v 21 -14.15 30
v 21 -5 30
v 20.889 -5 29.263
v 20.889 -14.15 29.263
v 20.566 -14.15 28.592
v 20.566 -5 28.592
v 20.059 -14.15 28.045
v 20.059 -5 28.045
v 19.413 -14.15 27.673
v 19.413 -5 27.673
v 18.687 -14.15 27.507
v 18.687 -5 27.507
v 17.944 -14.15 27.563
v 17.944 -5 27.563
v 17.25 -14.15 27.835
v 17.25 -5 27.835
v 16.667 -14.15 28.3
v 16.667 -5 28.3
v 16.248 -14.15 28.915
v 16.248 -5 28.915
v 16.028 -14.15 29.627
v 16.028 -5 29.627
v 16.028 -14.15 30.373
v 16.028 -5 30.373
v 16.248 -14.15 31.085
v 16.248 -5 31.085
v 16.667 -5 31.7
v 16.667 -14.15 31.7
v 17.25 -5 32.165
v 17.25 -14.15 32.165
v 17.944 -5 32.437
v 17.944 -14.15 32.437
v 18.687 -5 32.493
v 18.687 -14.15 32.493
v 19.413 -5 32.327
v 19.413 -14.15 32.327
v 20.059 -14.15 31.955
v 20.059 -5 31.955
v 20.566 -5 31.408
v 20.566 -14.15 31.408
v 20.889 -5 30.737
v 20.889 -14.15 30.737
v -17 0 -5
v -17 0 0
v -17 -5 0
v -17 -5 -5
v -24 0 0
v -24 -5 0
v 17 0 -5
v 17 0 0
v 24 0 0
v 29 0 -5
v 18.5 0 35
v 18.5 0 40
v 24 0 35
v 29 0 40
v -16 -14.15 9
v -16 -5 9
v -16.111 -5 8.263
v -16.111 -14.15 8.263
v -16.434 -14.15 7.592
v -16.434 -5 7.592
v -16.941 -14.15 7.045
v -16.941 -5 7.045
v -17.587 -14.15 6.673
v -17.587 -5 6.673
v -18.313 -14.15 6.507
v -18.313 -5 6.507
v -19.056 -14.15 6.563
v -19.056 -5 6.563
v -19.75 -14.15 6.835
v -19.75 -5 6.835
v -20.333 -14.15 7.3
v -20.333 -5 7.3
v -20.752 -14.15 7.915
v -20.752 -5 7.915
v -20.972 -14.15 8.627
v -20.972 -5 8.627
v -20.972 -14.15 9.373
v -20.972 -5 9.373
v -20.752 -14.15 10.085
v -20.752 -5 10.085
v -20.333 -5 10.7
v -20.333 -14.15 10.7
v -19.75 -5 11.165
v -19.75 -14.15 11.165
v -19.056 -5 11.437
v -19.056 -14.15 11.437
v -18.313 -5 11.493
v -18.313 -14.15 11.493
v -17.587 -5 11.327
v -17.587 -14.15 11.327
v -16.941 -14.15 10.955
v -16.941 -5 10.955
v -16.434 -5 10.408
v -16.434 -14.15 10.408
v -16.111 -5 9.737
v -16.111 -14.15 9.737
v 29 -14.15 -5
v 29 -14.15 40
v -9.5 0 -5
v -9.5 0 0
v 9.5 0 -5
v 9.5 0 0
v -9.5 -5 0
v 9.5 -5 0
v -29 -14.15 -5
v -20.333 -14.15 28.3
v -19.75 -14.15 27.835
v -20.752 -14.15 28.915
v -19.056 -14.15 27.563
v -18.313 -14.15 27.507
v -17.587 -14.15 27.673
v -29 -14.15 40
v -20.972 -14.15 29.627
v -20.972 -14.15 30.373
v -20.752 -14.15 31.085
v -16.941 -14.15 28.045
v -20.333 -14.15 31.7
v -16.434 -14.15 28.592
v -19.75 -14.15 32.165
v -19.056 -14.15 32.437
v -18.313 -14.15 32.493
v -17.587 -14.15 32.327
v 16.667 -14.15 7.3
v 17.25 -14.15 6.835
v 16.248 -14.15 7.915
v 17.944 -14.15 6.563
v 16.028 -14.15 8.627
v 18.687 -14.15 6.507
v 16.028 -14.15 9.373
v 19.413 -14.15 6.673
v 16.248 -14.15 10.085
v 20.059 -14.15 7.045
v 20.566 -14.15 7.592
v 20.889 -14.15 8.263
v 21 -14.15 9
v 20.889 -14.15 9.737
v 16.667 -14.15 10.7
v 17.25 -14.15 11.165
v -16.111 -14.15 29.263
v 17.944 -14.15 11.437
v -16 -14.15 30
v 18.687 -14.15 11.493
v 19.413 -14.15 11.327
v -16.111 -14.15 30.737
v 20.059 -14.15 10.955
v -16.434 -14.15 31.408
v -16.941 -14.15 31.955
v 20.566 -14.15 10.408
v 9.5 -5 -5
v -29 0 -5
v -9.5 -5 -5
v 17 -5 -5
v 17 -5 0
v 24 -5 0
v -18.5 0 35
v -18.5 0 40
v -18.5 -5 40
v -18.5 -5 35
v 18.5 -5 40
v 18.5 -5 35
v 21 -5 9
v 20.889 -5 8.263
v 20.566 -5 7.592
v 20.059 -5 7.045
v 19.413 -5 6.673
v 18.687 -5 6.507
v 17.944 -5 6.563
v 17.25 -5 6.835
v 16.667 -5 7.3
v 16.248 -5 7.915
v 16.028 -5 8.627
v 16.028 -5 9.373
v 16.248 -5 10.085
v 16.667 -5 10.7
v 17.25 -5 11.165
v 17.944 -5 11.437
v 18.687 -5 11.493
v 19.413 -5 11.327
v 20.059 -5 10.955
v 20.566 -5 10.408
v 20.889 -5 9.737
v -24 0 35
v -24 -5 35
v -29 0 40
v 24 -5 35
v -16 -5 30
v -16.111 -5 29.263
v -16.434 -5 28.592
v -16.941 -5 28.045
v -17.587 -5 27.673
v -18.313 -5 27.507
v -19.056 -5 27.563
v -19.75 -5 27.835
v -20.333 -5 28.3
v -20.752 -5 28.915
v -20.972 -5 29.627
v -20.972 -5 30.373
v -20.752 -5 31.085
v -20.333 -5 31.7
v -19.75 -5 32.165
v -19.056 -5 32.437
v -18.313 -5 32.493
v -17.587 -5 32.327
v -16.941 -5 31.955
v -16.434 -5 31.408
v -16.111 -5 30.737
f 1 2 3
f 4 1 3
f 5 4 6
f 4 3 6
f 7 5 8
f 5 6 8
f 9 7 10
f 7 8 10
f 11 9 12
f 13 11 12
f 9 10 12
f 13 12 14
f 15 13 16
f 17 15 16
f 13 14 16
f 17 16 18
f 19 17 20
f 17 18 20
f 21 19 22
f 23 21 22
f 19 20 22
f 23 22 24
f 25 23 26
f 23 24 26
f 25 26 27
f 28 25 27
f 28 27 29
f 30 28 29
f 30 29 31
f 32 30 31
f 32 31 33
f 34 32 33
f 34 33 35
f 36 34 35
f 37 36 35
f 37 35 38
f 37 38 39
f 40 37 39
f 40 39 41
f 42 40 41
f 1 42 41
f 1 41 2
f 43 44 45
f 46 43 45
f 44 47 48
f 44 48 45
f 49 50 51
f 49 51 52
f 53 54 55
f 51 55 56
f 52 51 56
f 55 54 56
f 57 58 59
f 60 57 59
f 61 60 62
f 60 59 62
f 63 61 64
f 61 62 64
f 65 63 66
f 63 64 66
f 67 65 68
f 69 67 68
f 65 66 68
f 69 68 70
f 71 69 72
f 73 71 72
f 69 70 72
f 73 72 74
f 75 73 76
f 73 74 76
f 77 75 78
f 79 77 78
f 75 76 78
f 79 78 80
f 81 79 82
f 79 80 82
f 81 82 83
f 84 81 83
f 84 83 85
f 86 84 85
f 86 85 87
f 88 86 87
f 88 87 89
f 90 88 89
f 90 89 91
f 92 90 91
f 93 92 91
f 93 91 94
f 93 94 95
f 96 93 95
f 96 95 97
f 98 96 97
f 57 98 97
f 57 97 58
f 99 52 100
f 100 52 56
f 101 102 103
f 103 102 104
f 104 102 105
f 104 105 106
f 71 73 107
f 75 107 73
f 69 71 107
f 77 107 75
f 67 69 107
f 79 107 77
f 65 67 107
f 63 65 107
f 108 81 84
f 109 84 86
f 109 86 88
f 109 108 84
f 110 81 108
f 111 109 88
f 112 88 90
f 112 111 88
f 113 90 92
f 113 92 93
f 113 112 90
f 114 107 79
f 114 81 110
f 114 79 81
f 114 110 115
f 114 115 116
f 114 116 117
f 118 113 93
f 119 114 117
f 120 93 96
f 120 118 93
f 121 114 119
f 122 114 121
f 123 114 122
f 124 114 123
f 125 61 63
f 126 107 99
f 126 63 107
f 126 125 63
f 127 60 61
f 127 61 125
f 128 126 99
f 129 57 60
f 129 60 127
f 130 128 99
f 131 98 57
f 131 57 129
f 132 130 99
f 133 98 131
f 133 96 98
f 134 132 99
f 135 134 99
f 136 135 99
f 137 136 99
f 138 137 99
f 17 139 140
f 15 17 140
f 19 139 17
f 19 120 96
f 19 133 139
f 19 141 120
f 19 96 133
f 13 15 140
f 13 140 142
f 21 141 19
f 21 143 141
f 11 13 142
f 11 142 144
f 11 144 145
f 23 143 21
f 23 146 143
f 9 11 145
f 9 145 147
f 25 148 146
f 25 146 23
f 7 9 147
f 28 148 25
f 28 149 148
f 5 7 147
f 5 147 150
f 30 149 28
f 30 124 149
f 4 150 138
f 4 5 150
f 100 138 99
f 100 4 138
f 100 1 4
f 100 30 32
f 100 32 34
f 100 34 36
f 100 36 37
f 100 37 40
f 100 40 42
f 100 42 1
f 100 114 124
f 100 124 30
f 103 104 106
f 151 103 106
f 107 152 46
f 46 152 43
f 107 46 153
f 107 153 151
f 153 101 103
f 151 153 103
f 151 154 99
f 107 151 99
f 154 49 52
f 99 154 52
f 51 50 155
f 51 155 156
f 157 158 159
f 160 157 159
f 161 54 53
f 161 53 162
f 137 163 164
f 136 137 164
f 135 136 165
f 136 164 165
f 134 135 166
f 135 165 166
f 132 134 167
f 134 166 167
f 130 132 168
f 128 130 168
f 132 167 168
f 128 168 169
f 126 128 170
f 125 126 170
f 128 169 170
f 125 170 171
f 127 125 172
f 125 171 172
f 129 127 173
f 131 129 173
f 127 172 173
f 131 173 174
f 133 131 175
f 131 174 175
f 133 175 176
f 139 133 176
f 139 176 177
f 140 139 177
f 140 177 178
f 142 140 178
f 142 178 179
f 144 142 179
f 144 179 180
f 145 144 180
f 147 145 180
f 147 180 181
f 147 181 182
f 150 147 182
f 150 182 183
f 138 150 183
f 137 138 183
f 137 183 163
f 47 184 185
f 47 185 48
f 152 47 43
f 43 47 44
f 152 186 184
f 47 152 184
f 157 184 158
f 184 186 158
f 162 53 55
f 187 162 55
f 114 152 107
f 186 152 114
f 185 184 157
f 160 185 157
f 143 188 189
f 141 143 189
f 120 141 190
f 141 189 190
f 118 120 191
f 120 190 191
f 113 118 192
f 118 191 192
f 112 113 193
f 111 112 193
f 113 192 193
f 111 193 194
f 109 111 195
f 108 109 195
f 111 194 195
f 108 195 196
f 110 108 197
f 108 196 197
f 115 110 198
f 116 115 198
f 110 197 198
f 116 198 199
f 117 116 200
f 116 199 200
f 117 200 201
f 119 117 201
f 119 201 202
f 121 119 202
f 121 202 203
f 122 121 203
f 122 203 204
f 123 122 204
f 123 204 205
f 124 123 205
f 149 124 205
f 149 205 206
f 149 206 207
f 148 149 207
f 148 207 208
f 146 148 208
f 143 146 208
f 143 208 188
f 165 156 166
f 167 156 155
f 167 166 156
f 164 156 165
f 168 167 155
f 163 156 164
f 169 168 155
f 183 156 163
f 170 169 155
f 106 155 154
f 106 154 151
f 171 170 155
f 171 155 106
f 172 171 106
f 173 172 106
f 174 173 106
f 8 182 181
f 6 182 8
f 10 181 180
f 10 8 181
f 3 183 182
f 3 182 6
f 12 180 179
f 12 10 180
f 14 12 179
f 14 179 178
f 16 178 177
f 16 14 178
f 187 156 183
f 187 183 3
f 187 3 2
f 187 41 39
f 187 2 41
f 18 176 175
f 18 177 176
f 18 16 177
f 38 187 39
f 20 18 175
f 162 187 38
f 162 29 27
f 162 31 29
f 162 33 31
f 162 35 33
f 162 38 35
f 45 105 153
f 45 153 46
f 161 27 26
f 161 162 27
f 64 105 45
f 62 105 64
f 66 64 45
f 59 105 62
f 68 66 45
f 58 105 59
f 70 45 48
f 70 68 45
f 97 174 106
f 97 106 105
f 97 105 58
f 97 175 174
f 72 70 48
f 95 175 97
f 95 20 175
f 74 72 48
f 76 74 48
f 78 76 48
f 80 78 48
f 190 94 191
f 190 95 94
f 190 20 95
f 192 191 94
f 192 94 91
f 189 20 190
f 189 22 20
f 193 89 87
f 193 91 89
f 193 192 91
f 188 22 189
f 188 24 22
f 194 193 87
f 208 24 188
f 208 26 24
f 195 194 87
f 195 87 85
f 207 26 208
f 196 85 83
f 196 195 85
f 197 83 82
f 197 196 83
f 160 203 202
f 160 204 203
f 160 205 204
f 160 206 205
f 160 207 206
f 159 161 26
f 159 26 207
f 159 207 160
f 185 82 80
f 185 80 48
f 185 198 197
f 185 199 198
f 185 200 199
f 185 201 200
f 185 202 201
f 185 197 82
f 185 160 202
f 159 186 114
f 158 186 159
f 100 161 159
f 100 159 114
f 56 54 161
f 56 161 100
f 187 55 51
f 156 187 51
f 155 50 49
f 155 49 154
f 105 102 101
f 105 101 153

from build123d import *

# Parameters (mm, degrees)
SKETCH001_W     = 58
SKETCH001_H     = 45
PAD_DEPTH       = 14.15
SKETCH002_W     = 48
SKETCH002_H     = 35
POCKET_DEPTH    = 5
SKETCH004_R     = 2.5
POCKET001_DEPTH = 10
SKETCH_W        = 37
SKETCH_H        = 5
POCKET002_DEPTH = 5
SKETCH005_W     = 7.5
SKETCH005_H     = 5
POCKET003_DEPTH = 5


with BuildPart() as part:
    # Sketch001 → Pad (new body)
    with BuildSketch(Plane.XZ):
        with Locations((0, 17.5)):
            Rectangle(SKETCH001_W, SKETCH001_H)
    extrude(amount=PAD_DEPTH)

    # Sketch002 → Pocket (cut)
    with BuildSketch(Plane(origin=(0, 0, 0), x_dir=(1, 0, 0), z_dir=(0, 1, 0))):
        with Locations((0, -17.5)):
            Rectangle(SKETCH002_W, SKETCH002_H)
    extrude(amount=-POCKET_DEPTH, mode=Mode.SUBTRACT)

    # Sketch004 → Pocket001 (cut)
    with BuildSketch(Plane(origin=(0, -5, 0), x_dir=(1, 0, 0), z_dir=(0, 1, 0))):
        with Locations((-18.5, -9)):
            Circle(SKETCH004_R)
        with Locations((18.5, -9)):
            Circle(SKETCH004_R)
        with Locations((-18.5, -30)):
            Circle(SKETCH004_R)
        with Locations((18.5, -30)):
            Circle(SKETCH004_R)
    extrude(amount=-POCKET001_DEPTH, mode=Mode.SUBTRACT)

    # Sketch → Pocket002 (cut)
    with BuildSketch(Plane(origin=(0, 0, 40), x_dir=(-1, 0, 0), z_dir=(0, 0, 1))):
        with Locations((0, 2.5)):
            Rectangle(SKETCH_W, SKETCH_H)
    extrude(amount=-POCKET002_DEPTH, mode=Mode.SUBTRACT)

    # Sketch005 → Pocket003 (cut)
    with BuildSketch(Plane(origin=(0, 0, 0), x_dir=(-1, 0, 0), z_dir=(0, 0, 1))):
        with Locations((13.25, 2.5)):
            Rectangle(SKETCH005_W, SKETCH005_H)
        with Locations((-13.25, 2.5)):
            Rectangle(SKETCH005_W, SKETCH005_H)
    extrude(amount=-POCKET003_DEPTH, mode=Mode.SUBTRACT)


solid = part.part
